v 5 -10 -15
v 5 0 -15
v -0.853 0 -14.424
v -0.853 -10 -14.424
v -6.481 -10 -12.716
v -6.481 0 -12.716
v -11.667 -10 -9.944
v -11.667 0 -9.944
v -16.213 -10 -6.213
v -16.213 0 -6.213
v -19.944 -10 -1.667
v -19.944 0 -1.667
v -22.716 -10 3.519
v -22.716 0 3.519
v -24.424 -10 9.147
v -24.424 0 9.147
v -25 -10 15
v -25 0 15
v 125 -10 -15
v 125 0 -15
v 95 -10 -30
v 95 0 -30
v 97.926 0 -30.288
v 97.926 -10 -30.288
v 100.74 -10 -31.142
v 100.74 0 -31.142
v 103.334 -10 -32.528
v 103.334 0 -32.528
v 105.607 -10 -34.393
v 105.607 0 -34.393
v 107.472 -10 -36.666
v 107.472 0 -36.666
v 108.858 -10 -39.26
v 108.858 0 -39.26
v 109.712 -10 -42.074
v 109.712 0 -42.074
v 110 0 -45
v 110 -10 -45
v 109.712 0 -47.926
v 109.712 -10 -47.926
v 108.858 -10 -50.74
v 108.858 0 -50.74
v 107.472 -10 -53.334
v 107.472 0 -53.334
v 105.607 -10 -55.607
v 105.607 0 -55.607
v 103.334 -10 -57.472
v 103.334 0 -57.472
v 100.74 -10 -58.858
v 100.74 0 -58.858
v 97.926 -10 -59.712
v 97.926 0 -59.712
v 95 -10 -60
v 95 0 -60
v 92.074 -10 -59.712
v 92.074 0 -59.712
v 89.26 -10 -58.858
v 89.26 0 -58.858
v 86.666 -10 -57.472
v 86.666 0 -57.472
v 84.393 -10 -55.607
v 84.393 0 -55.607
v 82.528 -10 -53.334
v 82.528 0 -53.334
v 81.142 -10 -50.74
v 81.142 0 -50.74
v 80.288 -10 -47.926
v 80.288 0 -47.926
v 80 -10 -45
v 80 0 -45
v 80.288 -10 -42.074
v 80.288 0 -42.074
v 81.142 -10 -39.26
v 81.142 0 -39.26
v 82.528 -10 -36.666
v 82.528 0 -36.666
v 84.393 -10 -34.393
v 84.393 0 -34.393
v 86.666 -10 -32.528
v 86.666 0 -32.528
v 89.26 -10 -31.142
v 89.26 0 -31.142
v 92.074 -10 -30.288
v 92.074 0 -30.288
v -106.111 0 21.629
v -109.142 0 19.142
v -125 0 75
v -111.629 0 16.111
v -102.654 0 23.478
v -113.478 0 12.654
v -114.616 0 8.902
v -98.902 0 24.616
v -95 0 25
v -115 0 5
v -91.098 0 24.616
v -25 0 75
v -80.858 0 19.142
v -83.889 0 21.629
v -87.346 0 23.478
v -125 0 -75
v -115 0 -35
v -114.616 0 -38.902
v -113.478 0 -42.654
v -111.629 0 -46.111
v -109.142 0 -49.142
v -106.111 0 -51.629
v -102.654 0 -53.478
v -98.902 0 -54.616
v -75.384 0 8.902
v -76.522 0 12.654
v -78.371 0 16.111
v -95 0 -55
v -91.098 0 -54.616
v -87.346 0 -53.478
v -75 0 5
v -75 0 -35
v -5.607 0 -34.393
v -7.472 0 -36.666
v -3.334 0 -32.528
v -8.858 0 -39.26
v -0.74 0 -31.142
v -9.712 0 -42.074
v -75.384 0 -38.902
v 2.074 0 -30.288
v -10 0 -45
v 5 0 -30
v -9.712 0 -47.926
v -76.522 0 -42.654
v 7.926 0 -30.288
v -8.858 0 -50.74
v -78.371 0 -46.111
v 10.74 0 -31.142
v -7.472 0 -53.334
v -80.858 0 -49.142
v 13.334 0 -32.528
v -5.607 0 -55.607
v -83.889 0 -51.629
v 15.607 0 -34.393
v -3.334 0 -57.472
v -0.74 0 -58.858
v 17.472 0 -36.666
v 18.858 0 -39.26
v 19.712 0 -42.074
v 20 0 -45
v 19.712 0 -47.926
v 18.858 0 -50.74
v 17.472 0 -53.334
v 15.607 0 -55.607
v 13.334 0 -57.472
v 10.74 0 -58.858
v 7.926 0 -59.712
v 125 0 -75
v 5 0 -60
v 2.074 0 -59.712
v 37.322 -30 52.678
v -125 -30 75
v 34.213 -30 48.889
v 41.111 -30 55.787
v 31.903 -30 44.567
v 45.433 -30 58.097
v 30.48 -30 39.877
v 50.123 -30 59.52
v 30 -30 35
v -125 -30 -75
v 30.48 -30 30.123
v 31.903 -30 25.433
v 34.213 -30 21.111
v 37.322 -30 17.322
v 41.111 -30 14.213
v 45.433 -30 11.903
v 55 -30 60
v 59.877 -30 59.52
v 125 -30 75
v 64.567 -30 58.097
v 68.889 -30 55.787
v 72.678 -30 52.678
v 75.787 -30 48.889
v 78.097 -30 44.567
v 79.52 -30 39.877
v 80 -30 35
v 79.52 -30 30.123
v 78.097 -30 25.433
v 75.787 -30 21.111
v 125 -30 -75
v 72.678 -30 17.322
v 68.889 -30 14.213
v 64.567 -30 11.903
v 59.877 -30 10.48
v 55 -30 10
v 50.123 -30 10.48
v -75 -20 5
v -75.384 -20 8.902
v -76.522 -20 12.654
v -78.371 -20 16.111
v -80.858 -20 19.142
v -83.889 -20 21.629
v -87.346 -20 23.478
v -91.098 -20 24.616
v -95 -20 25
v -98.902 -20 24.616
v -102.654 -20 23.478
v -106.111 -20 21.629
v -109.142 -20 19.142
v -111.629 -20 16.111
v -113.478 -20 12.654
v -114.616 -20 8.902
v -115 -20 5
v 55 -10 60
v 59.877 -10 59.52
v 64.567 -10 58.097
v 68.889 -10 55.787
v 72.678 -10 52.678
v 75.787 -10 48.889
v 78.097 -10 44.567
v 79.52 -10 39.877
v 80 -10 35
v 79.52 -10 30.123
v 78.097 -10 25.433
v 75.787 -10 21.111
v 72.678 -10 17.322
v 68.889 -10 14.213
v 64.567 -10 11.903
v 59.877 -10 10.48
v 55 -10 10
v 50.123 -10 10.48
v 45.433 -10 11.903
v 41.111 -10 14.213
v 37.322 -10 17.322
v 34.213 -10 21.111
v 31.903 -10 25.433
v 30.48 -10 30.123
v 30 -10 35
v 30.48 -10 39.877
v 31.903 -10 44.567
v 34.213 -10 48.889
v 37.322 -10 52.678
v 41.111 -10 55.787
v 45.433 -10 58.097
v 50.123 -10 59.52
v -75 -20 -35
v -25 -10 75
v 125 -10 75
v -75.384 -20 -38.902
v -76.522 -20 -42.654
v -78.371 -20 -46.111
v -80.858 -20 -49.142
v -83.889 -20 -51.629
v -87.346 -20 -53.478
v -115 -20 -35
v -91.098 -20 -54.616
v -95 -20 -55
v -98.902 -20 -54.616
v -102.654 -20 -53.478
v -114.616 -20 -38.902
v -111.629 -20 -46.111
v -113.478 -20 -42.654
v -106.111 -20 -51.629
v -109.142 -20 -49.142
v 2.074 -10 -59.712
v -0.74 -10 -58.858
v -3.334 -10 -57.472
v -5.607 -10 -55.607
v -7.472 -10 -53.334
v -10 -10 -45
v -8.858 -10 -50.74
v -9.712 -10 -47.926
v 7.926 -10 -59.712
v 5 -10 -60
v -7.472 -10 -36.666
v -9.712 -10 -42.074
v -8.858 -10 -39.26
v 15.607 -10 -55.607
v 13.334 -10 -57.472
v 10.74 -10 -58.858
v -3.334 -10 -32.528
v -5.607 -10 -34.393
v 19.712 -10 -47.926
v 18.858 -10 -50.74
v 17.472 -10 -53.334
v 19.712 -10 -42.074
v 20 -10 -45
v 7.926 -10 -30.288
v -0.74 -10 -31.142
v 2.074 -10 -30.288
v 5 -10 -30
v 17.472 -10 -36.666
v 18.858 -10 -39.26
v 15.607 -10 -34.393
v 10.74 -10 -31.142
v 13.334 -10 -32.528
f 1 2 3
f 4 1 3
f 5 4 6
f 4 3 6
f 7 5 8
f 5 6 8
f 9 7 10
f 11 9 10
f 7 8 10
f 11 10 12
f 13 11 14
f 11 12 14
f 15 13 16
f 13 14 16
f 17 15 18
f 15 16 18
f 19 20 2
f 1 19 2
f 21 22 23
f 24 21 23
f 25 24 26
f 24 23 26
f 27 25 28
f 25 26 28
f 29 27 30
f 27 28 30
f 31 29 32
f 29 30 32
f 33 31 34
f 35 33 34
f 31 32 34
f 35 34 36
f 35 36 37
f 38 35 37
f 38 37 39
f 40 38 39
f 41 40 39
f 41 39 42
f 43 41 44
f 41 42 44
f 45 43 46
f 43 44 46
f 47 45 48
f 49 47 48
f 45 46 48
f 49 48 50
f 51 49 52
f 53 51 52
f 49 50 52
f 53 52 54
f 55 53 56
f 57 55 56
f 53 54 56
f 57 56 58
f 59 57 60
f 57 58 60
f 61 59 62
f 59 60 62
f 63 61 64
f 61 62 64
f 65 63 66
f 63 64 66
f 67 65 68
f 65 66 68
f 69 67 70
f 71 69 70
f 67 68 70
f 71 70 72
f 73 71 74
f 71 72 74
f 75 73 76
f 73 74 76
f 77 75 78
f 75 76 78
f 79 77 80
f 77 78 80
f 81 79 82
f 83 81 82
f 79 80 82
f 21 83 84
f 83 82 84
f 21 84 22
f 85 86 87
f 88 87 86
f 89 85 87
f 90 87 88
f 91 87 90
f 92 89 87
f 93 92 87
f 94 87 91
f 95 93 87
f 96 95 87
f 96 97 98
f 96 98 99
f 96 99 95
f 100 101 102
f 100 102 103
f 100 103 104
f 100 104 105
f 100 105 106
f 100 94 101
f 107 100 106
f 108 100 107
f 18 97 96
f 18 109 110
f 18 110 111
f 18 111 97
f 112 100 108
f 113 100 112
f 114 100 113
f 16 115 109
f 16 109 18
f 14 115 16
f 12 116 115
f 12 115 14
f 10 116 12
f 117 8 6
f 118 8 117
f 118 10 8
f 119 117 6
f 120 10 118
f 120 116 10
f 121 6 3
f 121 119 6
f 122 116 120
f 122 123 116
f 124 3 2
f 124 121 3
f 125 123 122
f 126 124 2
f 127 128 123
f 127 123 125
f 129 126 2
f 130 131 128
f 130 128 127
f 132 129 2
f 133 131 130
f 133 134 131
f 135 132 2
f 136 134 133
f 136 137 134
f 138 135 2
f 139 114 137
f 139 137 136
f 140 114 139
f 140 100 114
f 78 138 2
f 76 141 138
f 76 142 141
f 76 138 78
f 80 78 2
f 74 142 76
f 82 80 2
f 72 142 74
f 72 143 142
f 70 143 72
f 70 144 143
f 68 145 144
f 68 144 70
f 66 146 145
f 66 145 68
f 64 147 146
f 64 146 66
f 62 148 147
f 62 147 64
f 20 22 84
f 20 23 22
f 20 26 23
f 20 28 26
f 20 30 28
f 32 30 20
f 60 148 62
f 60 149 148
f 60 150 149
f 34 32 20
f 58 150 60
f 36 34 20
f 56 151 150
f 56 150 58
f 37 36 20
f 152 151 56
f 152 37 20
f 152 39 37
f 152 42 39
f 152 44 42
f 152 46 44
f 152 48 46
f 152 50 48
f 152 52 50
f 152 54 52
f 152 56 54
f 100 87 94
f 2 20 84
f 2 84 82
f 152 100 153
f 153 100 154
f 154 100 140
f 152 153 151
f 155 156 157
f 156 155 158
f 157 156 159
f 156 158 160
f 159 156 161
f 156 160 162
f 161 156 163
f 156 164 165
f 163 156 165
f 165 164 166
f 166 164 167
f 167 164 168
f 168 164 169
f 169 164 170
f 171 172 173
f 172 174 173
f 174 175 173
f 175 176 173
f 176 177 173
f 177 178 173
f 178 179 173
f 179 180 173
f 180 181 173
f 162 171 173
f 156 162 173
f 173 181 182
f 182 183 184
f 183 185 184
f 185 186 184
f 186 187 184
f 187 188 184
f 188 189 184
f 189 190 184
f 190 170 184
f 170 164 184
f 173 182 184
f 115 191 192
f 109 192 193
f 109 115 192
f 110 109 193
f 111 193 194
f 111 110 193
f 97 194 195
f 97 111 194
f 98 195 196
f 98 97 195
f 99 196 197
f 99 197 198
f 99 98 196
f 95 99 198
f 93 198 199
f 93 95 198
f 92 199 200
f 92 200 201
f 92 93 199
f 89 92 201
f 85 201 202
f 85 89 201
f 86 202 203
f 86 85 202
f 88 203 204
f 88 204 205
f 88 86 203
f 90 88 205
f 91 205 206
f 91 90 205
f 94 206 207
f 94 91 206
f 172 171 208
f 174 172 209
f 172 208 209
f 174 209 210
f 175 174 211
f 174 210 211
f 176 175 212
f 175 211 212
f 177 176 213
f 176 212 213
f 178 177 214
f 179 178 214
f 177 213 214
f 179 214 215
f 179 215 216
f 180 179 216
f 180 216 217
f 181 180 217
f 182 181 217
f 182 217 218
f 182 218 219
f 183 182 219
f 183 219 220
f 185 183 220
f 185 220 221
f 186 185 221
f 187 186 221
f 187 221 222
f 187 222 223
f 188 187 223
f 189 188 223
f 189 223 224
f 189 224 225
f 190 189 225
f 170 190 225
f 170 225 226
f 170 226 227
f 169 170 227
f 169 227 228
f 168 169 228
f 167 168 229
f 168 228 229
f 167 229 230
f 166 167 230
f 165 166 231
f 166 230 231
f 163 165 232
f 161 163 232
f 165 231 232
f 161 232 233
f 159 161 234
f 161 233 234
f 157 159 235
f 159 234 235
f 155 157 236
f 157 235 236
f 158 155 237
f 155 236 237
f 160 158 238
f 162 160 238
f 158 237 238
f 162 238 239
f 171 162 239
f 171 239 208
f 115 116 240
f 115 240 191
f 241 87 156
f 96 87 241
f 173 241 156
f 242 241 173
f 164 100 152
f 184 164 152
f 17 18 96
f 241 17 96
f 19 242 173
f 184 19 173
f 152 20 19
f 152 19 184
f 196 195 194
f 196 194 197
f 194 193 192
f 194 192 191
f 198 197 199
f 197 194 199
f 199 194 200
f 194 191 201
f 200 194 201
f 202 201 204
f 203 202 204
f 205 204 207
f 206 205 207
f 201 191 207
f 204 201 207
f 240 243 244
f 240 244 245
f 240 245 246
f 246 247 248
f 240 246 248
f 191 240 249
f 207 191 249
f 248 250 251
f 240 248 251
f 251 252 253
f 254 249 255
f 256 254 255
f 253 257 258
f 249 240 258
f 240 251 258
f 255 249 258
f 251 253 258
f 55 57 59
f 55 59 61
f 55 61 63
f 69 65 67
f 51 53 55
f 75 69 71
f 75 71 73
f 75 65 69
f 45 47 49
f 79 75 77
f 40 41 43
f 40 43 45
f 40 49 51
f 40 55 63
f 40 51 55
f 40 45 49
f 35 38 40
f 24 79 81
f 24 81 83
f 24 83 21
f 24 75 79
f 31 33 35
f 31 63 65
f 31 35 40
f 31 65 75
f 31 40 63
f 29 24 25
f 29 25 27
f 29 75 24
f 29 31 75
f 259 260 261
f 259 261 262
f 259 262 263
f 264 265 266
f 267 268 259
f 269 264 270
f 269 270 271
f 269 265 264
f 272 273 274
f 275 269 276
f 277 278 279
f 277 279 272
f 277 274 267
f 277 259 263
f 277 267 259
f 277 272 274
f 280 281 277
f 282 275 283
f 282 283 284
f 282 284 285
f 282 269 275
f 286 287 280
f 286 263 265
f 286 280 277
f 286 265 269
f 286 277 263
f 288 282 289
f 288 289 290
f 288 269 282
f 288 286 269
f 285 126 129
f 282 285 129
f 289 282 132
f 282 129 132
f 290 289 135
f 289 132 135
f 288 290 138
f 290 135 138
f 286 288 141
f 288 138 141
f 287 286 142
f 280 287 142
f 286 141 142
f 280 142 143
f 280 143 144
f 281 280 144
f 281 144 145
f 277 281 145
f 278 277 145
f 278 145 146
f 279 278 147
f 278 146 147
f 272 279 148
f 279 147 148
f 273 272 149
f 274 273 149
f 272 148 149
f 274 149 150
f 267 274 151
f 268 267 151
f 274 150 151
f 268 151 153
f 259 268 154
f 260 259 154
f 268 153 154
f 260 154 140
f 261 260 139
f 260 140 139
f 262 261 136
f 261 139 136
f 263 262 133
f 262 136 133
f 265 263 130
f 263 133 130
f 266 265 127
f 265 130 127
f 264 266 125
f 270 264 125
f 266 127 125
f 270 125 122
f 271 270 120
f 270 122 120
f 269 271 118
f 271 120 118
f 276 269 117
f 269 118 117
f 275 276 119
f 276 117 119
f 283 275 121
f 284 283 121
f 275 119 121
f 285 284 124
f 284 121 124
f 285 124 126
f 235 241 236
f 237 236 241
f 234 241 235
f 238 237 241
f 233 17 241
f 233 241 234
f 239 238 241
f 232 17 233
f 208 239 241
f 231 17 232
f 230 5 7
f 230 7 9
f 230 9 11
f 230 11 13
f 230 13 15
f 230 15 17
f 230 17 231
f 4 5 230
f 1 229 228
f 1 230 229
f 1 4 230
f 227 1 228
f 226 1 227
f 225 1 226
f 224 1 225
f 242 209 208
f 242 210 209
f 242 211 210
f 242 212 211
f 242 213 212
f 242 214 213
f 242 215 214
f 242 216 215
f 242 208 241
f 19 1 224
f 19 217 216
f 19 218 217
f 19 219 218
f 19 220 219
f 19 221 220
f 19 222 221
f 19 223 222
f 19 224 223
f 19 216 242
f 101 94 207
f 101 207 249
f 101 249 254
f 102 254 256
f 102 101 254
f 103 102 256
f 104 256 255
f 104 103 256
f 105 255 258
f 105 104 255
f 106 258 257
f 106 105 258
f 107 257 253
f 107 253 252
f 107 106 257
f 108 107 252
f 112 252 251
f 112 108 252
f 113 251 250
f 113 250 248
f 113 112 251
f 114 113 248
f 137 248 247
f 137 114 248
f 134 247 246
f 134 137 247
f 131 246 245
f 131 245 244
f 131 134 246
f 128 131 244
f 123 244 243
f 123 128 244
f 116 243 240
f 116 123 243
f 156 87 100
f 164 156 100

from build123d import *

# Parameters (mm, degrees)
SKETCH2_W           = 250
SKETCH2_H           = 150
BOSS_EXTRUDE1_DEPTH = 30
CUT_EXTRUDE2_DEPTH  = 20
SKETCH3_5_R         = 15
CUT_EXTRUDE3_DEPTH  = 10
SKETCH3_6_R         = 25
CUT_EXTRUDE4_DEPTH  = 149.828760661
SKETCH3_7_R         = 25
CUT_EXTRUDE5_DEPTH  = 10


with BuildPart() as part:
    # Sketch2 → Boss-Extrude1 (new body)
    with BuildSketch(Plane(origin=(0, 0, 0), x_dir=(1, 0, 0), z_dir=(0, 1, 0))):
        Rectangle(SKETCH2_W, SKETCH2_H)
    extrude(amount=-BOSS_EXTRUDE1_DEPTH)

    # Sketch3 → Cut-Extrude2 (cut)
    with BuildSketch(Plane(origin=(0, 0, 0), x_dir=(1, 0, 0), z_dir=(0, 1, 0))):
        with BuildLine():
            Line((-75, -5), (-75, 35))
            ThreePointArc((-75, 35), (-95, 55), (-115, 35))
            Line((-115, 35), (-115, -5))
            ThreePointArc((-115, -5), (-95, -25), (-75, -5))
        make_face()
    extrude(amount=-CUT_EXTRUDE2_DEPTH, mode=Mode.SUBTRACT)

    # Sketch3<5> → Cut-Extrude3 (cut)
    with BuildSketch(Plane(origin=(0, 0, 0), x_dir=(1, 0, 0), z_dir=(0, 1, 0))):
        with Locations((5, 45)):
            Circle(SKETCH3_5_R)
        with Locations((95, 45)):
            Circle(SKETCH3_5_R)
    extrude(amount=-CUT_EXTRUDE3_DEPTH, mode=Mode.SUBTRACT)

    # Sketch3<6> → Cut-Extrude4 (cut, through all)
    with BuildSketch(Plane(origin=(0, 0, 0), x_dir=(1, 0, 0), z_dir=(0, 1, 0))):
        with Locations((55, -35)):
            Circle(SKETCH3_6_R)
    extrude(amount=-CUT_EXTRUDE4_DEPTH, mode=Mode.SUBTRACT)

    # Sketch3<7> → Cut-Extrude5 (cut)
    with BuildSketch(Plane(origin=(0, 0, 0), x_dir=(1, 0, 0), z_dir=(0, 1, 0))):
        with BuildLine():
            Line((-25, -75), (125, -75))
            Line((125, -75), (125, 15))
            Line((125, 15), (5, 15))
            ThreePointArc((5, 15), (-16.213203436, 6.213203436), (-25, -15))
            Line((-25, -15), (-25, -75))
        make_face()
        with Locations((55, -35)):
            Circle(SKETCH3_7_R, mode=Mode.SUBTRACT)
    extrude(amount=-CUT_EXTRUDE5_DEPTH, mode=Mode.SUBTRACT)


solid = part.part
